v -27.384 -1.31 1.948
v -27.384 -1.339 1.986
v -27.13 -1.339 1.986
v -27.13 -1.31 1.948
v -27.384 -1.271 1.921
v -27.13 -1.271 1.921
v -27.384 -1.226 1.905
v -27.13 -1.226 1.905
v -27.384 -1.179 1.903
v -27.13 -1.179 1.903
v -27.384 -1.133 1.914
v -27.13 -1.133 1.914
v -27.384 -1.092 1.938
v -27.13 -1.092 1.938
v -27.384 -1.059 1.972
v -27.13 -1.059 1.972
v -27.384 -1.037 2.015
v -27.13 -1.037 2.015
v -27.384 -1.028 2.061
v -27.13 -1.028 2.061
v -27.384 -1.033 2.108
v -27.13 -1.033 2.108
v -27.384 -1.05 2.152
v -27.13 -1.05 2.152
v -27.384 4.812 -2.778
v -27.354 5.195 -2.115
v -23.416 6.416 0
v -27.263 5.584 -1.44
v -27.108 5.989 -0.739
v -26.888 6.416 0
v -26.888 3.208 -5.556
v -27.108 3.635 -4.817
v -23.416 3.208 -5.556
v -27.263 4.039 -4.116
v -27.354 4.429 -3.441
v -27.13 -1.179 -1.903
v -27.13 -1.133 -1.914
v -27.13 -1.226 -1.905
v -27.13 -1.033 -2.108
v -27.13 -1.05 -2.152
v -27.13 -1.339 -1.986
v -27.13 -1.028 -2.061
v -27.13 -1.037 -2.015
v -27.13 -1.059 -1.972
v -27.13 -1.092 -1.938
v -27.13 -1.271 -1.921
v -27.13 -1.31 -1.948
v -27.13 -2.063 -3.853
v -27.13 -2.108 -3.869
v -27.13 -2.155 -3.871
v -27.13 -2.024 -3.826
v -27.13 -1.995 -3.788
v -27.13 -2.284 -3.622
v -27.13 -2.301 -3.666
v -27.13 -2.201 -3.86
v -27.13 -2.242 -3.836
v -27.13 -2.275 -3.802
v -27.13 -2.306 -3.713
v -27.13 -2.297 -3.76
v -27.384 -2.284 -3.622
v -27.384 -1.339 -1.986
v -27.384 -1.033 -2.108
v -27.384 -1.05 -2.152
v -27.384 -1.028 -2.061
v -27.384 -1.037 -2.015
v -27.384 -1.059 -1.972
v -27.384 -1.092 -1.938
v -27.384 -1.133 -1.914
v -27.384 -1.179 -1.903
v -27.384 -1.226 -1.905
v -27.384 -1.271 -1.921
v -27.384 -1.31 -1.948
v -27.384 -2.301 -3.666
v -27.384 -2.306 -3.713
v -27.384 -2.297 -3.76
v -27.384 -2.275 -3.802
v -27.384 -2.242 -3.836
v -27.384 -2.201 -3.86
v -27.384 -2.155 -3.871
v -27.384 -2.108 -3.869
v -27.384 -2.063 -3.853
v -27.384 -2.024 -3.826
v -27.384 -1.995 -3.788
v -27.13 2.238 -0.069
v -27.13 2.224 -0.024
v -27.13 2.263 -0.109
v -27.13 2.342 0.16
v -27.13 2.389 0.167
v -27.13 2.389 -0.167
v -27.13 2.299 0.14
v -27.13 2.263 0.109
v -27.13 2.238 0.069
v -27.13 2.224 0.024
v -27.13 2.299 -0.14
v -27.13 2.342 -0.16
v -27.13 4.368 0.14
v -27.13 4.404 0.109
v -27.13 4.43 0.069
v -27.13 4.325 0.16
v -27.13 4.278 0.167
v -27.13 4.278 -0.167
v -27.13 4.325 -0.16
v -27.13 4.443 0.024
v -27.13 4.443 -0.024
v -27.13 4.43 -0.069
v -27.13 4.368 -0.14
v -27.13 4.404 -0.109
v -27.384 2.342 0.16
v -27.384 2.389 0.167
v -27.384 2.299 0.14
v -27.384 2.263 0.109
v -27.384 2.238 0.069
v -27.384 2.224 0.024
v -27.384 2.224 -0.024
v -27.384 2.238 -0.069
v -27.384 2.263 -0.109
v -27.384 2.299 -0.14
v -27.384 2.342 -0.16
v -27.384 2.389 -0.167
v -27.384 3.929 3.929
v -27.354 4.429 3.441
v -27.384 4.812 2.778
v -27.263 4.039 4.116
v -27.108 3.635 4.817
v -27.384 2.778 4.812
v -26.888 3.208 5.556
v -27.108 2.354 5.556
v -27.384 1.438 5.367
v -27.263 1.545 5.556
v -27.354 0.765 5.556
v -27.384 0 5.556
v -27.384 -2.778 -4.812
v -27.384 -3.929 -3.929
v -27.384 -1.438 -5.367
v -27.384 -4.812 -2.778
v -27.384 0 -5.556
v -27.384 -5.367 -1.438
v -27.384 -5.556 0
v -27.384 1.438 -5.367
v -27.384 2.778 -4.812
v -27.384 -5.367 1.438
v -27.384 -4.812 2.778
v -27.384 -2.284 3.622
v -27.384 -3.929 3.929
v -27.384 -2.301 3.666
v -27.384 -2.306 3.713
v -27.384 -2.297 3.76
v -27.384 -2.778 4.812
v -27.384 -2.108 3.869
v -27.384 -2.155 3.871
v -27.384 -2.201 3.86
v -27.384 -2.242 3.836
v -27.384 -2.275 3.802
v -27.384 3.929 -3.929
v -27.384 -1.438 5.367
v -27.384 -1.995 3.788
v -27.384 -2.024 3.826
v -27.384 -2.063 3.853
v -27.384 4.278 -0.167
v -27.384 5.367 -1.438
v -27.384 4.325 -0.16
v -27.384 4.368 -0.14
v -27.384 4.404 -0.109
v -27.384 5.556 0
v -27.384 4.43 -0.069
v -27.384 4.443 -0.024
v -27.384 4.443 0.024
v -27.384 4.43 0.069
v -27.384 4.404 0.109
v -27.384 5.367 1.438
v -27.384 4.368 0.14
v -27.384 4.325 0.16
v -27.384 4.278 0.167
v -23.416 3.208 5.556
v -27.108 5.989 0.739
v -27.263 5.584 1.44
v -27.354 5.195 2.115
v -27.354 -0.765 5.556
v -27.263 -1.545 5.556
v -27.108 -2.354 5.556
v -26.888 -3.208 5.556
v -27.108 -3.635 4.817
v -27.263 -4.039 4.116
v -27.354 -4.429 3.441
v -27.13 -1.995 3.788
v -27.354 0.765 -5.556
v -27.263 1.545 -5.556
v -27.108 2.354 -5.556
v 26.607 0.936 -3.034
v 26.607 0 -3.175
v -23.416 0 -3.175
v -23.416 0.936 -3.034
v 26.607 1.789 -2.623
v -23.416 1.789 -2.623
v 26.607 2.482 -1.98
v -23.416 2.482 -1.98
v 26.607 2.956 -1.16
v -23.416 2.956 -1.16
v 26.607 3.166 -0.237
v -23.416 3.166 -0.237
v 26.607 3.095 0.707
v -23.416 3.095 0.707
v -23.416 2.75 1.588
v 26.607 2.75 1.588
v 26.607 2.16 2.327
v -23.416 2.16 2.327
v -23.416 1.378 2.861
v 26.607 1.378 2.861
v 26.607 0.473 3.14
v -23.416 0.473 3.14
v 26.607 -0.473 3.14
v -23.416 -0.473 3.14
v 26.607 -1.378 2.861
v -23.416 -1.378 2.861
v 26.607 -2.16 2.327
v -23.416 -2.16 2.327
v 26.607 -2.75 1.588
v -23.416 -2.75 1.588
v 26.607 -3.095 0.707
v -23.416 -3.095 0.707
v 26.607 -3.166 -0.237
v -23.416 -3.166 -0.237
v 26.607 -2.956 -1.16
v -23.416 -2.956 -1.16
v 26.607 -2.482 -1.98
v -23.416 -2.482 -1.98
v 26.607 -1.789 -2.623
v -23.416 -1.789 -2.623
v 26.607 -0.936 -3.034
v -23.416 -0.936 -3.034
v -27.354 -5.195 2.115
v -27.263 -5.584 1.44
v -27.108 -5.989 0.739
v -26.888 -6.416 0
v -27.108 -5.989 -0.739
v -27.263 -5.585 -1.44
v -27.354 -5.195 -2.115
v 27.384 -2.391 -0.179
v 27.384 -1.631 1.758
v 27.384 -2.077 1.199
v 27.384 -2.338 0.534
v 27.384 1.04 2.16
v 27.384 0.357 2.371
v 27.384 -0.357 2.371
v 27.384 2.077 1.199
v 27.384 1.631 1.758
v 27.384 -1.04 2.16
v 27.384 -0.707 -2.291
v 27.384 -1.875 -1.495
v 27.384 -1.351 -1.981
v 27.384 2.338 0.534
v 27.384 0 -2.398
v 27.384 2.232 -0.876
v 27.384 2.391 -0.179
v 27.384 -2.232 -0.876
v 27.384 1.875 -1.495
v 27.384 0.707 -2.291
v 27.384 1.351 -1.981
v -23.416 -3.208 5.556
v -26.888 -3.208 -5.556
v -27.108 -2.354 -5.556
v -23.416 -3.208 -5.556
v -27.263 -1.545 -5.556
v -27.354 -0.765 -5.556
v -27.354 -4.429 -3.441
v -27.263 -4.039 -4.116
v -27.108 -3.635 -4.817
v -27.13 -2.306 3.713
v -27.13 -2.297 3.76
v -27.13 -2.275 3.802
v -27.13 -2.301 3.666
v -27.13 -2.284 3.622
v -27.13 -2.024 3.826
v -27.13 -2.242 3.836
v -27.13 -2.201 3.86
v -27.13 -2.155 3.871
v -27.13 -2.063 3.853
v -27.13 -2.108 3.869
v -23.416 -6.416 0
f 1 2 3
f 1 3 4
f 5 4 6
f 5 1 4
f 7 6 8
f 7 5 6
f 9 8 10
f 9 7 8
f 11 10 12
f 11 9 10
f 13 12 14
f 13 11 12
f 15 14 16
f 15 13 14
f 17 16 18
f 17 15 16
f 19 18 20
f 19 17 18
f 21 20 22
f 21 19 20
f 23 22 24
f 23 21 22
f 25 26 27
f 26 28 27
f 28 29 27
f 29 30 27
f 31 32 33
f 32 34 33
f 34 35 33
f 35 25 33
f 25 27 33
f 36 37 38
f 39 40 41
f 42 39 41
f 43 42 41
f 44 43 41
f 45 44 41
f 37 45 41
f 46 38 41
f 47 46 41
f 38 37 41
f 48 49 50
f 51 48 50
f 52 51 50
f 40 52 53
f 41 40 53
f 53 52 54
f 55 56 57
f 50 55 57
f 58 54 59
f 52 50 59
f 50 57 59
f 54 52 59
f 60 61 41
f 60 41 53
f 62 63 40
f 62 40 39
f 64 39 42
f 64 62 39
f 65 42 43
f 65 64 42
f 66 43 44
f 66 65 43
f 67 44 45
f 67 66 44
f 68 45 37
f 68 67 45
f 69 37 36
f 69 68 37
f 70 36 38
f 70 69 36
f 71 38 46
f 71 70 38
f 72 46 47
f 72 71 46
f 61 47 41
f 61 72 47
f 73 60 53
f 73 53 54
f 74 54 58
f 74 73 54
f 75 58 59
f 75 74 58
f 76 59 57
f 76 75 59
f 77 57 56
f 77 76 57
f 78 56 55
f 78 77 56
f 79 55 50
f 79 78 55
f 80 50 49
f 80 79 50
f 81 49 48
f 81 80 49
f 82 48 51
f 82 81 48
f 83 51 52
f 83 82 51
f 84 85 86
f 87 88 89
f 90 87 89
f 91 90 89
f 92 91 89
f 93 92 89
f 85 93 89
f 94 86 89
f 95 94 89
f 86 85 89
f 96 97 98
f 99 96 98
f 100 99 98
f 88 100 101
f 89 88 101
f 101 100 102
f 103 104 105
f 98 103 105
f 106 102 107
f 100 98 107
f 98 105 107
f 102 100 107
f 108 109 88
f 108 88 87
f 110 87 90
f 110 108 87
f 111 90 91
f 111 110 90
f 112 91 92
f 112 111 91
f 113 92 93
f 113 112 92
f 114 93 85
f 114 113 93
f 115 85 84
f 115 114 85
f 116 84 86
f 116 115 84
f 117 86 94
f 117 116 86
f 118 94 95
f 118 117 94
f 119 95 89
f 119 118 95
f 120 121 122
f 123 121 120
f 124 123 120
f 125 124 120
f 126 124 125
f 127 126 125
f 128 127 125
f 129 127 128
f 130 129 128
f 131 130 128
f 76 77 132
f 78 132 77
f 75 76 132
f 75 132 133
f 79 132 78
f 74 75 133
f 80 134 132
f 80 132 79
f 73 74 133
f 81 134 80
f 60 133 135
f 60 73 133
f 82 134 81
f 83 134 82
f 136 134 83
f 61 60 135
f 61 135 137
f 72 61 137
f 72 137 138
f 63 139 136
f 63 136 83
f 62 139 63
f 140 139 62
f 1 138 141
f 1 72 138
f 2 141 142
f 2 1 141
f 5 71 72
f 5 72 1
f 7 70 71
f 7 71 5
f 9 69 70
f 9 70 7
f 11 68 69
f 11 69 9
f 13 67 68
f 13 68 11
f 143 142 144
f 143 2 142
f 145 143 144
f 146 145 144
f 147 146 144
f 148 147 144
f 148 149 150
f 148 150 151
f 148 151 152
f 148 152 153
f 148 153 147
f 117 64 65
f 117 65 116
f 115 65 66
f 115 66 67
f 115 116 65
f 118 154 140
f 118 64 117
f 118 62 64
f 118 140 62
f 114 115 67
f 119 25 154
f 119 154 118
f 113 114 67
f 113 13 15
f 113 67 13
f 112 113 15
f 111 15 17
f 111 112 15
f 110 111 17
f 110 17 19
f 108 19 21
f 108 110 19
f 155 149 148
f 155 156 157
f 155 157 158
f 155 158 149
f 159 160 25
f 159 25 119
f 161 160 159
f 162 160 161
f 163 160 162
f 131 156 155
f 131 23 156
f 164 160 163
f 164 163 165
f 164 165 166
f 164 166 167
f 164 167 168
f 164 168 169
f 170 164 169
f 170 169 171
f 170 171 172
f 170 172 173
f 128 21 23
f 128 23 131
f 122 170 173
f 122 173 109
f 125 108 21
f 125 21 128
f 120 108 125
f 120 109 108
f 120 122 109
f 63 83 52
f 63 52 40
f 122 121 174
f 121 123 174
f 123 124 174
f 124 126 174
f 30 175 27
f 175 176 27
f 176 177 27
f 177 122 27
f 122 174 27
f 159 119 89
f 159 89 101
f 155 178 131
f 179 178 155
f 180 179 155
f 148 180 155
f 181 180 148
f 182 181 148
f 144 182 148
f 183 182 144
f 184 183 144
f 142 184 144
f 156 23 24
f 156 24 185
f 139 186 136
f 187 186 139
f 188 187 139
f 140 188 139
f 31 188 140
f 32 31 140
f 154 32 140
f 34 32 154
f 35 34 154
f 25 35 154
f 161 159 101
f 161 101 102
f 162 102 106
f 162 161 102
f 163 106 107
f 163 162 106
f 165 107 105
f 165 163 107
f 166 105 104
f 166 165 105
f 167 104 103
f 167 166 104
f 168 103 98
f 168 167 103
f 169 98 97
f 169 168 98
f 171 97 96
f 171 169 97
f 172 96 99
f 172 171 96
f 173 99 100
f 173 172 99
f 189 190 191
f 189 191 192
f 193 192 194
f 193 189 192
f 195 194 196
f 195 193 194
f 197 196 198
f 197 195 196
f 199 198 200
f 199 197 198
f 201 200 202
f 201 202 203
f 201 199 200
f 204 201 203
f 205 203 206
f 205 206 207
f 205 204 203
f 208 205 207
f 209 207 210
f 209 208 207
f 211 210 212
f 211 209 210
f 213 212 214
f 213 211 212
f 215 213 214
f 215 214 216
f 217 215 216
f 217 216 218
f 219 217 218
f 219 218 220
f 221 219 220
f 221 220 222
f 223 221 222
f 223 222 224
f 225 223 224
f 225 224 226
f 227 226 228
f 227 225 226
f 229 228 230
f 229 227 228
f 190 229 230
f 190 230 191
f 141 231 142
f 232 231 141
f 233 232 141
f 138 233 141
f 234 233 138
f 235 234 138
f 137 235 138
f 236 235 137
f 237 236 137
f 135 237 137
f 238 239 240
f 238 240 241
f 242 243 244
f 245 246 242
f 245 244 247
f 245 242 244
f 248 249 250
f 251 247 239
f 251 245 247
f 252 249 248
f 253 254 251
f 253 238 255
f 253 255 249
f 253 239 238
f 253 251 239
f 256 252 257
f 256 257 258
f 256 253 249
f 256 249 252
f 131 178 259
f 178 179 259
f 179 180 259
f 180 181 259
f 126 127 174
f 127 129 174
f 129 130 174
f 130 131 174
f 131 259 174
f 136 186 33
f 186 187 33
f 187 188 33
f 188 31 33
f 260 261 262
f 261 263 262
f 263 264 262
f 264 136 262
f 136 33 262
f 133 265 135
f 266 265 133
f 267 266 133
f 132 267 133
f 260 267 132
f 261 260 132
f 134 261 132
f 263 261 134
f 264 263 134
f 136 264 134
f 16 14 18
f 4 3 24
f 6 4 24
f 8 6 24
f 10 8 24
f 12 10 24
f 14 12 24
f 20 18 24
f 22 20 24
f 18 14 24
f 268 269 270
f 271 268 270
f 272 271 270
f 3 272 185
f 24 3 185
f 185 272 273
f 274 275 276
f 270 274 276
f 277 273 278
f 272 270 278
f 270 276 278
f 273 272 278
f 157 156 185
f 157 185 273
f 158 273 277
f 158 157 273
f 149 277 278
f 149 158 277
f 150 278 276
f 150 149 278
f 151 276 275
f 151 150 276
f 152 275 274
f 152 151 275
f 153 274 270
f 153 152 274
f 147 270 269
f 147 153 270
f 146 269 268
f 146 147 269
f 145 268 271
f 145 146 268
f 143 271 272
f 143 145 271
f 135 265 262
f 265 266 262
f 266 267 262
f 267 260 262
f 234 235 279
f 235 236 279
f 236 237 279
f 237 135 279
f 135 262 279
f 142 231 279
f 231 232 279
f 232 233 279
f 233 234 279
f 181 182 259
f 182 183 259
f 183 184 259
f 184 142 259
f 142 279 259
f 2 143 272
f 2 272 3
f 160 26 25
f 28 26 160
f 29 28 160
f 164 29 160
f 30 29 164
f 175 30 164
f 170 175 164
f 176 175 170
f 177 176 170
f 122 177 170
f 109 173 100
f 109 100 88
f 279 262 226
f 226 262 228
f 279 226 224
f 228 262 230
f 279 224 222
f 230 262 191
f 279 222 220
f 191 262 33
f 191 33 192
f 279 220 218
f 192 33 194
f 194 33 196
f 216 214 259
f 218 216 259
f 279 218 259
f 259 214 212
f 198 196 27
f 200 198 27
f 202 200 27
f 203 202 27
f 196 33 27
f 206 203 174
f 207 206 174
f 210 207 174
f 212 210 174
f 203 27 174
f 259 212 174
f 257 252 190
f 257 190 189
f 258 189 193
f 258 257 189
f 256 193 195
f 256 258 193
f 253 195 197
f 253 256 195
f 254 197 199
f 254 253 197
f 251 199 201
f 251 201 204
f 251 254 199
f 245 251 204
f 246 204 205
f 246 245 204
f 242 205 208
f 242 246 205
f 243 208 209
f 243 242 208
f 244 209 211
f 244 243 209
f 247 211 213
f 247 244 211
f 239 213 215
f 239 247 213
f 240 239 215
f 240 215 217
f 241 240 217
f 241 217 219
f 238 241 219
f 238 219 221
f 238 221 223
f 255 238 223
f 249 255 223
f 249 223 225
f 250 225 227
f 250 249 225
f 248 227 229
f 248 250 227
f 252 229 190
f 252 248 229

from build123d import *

# Parameters (mm, degrees)
SKETCH5_R           = 3.175
BOSS_EXTRUDE3_DEPTH = 50.8
CHAMFER1_SIZE       = 0.77724
BOSS_EXTRUDE4_DEPTH = 3.96875
SKETCH8_OUTSIDE_W   = 217.768
SKETCH8_OUTSIDE_H   = 219.488
SKETCH8_OUTSIDE_R   = 5.55625
CUT_EXTRUDE3_DEPTH  = 55.76875
CUT_EXTRUDE3_TAPER  = 60
CUT_EXTRUDE4_DEPTH  = 0.254
CIRPATTERN1_COUNT   = 3


with BuildPart() as part:
    # Sketch5 → Boss-Extrude3 (new body)
    with BuildSketch(Plane(origin=(27.384375, 0, 0), x_dir=(0, 0, -1), z_dir=(1, 0, 0))):
        Circle(SKETCH5_R)
    extrude(amount=-BOSS_EXTRUDE3_DEPTH)

    # Chamfer1
    chamfer1_edges = [part.edges().sort_by_distance(p)[0] for p in [
        (27.384375, 0, 3.175),
    ]]
    chamfer(chamfer1_edges, length=CHAMFER1_SIZE)

    # Sketch6 → Boss-Extrude4 (add)
    with BuildSketch(Plane.ZY.offset(23.415625)):
        Polygon((5.55625, 3.207902433), (0, 6.415804866), (-5.55625, 3.207902433), (-5.55625, -3.207902433), (0, -6.415804866), (5.55625, -3.207902433), align=None)
    extrude(amount=BOSS_EXTRUDE4_DEPTH)

    # Sketch8 outside → Cut-Extrude3 (cut, through all)
    with BuildSketch(Plane.ZY.offset(27.384375)):
        Rectangle(SKETCH8_OUTSIDE_W, SKETCH8_OUTSIDE_H)
        Circle(SKETCH8_OUTSIDE_R, mode=Mode.SUBTRACT)
    extrude(amount=-CUT_EXTRUDE3_DEPTH, taper=CUT_EXTRUDE3_TAPER, mode=Mode.SUBTRACT)

    # Sketch12 → Cut-Extrude4 (cut)
    with BuildSketch(Plane.ZY.offset(27.384375)):
        with BuildLine():
            Line((0.1666875, 4.2783125), (0.1666875, 2.3891875))
            ThreePointArc((0.1666875, 2.3891875), (0, 2.2225), (-0.1666875, 2.3891875))
            Line((-0.1666875, 2.3891875), (-0.1666875, 4.2783125))
            ThreePointArc((-0.1666875, 4.2783125), (0, 4.445), (0.1666875, 4.2783125))
        make_face()
    cut_extrude4 = extrude(amount=-CUT_EXTRUDE4_DEPTH, mode=Mode.SUBTRACT)

    # CirPattern1: Cut-Extrude4 ×3 about axis
    cirpattern1_axis = Axis((0, 0, 0), (1, 0, 0))
    for i in range(1, CIRPATTERN1_COUNT):
        add(cut_extrude4.rotate(cirpattern1_axis, i * 360 / CIRPATTERN1_COUNT), mode=Mode.SUBTRACT)


solid = part.part
